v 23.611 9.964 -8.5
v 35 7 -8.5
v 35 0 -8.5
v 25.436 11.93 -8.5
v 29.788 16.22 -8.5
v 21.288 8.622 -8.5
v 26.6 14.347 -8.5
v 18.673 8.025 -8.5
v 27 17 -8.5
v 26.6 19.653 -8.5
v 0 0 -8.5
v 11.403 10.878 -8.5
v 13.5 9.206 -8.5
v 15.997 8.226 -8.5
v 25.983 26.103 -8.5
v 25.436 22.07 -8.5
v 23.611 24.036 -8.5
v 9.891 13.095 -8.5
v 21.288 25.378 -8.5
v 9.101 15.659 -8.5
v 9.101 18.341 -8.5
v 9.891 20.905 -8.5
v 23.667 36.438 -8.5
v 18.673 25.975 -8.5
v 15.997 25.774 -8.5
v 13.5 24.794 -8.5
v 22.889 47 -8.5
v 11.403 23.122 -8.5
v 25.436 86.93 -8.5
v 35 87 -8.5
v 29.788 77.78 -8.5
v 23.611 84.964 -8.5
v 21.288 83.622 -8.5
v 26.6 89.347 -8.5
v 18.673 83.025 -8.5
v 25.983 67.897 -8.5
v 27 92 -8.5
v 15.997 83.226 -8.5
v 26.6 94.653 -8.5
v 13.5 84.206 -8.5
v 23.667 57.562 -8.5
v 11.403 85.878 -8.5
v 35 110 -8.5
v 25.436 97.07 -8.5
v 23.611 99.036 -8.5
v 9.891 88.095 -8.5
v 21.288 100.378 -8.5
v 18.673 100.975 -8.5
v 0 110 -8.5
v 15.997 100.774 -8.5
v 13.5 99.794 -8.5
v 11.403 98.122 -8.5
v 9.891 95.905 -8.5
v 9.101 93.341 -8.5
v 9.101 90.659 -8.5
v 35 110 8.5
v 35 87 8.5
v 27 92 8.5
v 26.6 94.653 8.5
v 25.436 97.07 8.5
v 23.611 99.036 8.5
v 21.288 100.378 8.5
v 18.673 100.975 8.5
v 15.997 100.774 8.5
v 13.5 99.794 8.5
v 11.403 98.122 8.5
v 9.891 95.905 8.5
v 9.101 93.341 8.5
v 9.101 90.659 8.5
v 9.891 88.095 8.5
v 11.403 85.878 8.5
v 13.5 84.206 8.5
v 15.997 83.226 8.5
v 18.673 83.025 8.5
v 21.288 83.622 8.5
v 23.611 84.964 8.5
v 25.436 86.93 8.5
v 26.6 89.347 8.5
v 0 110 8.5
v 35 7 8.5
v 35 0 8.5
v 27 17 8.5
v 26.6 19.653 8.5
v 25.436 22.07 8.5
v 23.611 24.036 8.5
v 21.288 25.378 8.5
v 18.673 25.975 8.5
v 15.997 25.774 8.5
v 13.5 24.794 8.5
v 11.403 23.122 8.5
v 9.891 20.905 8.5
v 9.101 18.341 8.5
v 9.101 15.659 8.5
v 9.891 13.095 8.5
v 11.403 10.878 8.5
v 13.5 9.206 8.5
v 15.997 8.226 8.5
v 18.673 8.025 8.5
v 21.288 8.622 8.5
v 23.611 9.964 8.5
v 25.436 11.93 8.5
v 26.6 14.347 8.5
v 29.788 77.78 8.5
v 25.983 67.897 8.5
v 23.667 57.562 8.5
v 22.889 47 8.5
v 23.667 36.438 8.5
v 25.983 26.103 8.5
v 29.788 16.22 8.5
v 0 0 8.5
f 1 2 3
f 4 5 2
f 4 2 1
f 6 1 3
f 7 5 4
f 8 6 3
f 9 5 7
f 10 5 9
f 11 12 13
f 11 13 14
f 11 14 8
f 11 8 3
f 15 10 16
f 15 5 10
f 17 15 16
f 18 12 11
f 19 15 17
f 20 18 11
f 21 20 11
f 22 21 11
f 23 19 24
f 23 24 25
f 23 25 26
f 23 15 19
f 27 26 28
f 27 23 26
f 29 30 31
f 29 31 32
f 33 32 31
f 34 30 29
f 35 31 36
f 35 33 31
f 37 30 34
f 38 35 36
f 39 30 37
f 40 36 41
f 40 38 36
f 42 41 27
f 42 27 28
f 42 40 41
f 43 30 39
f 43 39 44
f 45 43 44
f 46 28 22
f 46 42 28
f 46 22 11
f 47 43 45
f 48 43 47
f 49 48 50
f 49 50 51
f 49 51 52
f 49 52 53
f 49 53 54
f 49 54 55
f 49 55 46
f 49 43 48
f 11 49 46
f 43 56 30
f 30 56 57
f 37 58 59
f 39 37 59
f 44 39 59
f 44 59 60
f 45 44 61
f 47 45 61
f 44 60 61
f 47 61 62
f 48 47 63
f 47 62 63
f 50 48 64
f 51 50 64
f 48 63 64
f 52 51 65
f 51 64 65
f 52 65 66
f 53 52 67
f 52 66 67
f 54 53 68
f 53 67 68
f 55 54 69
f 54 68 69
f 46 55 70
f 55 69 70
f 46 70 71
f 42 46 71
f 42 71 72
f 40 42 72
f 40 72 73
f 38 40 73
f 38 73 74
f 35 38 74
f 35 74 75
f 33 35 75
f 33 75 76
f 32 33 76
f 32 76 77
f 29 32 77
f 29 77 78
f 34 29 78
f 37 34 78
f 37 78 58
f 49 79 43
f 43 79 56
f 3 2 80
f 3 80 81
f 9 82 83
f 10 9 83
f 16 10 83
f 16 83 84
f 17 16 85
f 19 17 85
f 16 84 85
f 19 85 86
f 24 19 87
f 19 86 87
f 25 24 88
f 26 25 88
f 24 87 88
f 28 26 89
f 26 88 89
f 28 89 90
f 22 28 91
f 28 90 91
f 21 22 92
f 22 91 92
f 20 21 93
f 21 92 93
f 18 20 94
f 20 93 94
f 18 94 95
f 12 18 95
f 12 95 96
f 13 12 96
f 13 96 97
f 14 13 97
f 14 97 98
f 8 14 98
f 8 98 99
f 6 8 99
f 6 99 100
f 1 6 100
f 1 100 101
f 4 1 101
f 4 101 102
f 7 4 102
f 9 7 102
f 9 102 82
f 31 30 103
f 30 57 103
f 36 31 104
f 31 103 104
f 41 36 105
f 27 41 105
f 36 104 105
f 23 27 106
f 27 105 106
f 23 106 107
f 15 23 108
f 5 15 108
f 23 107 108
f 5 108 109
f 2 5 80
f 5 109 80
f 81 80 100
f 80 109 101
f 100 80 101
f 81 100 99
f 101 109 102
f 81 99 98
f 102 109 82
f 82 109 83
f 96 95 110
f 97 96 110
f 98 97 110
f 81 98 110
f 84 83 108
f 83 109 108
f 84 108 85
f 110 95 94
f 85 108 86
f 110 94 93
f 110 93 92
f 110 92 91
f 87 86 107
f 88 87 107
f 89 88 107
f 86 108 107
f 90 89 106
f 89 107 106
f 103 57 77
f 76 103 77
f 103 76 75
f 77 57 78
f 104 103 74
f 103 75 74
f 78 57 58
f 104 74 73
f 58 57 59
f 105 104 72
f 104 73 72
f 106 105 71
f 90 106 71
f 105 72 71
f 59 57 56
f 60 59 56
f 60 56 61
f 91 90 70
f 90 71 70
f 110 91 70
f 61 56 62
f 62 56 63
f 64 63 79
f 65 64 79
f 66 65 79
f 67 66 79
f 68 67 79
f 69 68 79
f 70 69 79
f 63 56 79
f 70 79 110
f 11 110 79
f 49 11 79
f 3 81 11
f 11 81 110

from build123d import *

# Parameters (mm, degrees)
BOSS_EXTRUDE1_DEPTH = 8.5
SKETCH2_R           = 9
CUT_EXTRUDE1_DEPTH  = 117.679046962


with BuildPart() as part:
    # Sketch1 → Boss-Extrude1 (new, symmetric)
    with BuildSketch(Plane.XY):
        with BuildLine():
            Line((0, 110), (35, 110))
            Line((35, 110), (35, 87))
            ThreePointArc((35, 87), (22.888974491, 47), (35, 7))
            Line((35, 7), (35, 0))
            Line((35, 0), (0, 0))
            Line((0, 0), (0, 110))
        make_face()
    extrude(amount=BOSS_EXTRUDE1_DEPTH, both=True)

    # Sketch2 → Cut-Extrude1 (cut, through all)
    with BuildSketch(Plane.XY.offset(8.5)):
        with Locations((18, 92)):
            Circle(SKETCH2_R)
        with Locations((18, 17)):
            Circle(SKETCH2_R)
    extrude(amount=-CUT_EXTRUDE1_DEPTH, mode=Mode.SUBTRACT)


solid = part.part
